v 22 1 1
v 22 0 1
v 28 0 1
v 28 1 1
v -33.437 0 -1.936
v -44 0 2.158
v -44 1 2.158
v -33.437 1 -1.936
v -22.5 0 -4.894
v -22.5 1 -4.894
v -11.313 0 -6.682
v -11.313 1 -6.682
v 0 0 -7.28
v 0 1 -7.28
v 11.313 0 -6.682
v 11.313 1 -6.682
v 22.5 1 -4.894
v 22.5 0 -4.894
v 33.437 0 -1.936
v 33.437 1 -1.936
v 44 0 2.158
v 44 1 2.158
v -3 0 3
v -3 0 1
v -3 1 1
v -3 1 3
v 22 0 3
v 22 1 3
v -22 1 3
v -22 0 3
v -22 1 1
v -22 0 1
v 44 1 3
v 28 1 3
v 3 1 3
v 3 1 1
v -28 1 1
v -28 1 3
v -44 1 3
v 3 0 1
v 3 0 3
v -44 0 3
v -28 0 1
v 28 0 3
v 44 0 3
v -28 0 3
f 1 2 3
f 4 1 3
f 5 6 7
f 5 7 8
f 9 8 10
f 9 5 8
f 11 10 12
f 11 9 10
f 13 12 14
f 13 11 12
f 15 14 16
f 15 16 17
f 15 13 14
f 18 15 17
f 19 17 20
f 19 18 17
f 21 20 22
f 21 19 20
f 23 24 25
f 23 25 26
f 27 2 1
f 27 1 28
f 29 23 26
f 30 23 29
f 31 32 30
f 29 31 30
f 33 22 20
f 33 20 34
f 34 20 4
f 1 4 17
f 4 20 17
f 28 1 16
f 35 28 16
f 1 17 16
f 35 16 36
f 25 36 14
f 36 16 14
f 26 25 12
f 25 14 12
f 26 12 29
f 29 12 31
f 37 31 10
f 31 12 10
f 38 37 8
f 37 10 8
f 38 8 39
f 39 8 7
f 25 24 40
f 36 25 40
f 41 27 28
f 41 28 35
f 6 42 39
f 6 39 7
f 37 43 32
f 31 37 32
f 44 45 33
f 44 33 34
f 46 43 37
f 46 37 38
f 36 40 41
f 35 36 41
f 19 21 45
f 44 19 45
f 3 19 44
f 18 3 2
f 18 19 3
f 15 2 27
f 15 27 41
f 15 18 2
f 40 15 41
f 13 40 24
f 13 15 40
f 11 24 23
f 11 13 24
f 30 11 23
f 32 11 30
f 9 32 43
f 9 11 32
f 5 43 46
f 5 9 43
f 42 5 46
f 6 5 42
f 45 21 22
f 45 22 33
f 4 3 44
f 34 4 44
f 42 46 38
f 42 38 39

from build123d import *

# Parameters (mm, degrees)
EXTRUDE_1_DEPTH     = 1
SKETCH_2_W          = 6
SKETCH_2_H          = 4
CUT_EXTRUDE_1_DEPTH = 2


with BuildPart() as part:
    # 草图1 → 凸台-拉伸1 (new body)
    with BuildSketch(Plane(origin=(0, 0, 0), x_dir=(1, 0, 0), z_dir=(0, 1, 0))):
        with BuildLine():
            Line((-30, -3), (-44, -3))
            Line((-44, -3), (-44, -2.158291102))
            ThreePointArc((-44, -2.158291102), (0, 7.280007457), (44, -2.158291102))
            Line((44, -2.158291102), (44, -3))
            Line((44, -3), (30, -3))
            Line((30, -3), (-30, -3))
        make_face()
    extrude(amount=EXTRUDE_1_DEPTH)

    # 草图2 → 切除-拉伸1 (cut, through all)
    with BuildSketch(Plane.XZ):
        with Locations((0, 3)):
            Rectangle(SKETCH_2_W, SKETCH_2_H)
        with Locations((25, 3)):
            Rectangle(SKETCH_2_W, SKETCH_2_H)
        with Locations((-25, 3)):
            Rectangle(SKETCH_2_W, SKETCH_2_H)
    extrude(amount=-CUT_EXTRUDE_1_DEPTH, mode=Mode.SUBTRACT)


solid = part.part
